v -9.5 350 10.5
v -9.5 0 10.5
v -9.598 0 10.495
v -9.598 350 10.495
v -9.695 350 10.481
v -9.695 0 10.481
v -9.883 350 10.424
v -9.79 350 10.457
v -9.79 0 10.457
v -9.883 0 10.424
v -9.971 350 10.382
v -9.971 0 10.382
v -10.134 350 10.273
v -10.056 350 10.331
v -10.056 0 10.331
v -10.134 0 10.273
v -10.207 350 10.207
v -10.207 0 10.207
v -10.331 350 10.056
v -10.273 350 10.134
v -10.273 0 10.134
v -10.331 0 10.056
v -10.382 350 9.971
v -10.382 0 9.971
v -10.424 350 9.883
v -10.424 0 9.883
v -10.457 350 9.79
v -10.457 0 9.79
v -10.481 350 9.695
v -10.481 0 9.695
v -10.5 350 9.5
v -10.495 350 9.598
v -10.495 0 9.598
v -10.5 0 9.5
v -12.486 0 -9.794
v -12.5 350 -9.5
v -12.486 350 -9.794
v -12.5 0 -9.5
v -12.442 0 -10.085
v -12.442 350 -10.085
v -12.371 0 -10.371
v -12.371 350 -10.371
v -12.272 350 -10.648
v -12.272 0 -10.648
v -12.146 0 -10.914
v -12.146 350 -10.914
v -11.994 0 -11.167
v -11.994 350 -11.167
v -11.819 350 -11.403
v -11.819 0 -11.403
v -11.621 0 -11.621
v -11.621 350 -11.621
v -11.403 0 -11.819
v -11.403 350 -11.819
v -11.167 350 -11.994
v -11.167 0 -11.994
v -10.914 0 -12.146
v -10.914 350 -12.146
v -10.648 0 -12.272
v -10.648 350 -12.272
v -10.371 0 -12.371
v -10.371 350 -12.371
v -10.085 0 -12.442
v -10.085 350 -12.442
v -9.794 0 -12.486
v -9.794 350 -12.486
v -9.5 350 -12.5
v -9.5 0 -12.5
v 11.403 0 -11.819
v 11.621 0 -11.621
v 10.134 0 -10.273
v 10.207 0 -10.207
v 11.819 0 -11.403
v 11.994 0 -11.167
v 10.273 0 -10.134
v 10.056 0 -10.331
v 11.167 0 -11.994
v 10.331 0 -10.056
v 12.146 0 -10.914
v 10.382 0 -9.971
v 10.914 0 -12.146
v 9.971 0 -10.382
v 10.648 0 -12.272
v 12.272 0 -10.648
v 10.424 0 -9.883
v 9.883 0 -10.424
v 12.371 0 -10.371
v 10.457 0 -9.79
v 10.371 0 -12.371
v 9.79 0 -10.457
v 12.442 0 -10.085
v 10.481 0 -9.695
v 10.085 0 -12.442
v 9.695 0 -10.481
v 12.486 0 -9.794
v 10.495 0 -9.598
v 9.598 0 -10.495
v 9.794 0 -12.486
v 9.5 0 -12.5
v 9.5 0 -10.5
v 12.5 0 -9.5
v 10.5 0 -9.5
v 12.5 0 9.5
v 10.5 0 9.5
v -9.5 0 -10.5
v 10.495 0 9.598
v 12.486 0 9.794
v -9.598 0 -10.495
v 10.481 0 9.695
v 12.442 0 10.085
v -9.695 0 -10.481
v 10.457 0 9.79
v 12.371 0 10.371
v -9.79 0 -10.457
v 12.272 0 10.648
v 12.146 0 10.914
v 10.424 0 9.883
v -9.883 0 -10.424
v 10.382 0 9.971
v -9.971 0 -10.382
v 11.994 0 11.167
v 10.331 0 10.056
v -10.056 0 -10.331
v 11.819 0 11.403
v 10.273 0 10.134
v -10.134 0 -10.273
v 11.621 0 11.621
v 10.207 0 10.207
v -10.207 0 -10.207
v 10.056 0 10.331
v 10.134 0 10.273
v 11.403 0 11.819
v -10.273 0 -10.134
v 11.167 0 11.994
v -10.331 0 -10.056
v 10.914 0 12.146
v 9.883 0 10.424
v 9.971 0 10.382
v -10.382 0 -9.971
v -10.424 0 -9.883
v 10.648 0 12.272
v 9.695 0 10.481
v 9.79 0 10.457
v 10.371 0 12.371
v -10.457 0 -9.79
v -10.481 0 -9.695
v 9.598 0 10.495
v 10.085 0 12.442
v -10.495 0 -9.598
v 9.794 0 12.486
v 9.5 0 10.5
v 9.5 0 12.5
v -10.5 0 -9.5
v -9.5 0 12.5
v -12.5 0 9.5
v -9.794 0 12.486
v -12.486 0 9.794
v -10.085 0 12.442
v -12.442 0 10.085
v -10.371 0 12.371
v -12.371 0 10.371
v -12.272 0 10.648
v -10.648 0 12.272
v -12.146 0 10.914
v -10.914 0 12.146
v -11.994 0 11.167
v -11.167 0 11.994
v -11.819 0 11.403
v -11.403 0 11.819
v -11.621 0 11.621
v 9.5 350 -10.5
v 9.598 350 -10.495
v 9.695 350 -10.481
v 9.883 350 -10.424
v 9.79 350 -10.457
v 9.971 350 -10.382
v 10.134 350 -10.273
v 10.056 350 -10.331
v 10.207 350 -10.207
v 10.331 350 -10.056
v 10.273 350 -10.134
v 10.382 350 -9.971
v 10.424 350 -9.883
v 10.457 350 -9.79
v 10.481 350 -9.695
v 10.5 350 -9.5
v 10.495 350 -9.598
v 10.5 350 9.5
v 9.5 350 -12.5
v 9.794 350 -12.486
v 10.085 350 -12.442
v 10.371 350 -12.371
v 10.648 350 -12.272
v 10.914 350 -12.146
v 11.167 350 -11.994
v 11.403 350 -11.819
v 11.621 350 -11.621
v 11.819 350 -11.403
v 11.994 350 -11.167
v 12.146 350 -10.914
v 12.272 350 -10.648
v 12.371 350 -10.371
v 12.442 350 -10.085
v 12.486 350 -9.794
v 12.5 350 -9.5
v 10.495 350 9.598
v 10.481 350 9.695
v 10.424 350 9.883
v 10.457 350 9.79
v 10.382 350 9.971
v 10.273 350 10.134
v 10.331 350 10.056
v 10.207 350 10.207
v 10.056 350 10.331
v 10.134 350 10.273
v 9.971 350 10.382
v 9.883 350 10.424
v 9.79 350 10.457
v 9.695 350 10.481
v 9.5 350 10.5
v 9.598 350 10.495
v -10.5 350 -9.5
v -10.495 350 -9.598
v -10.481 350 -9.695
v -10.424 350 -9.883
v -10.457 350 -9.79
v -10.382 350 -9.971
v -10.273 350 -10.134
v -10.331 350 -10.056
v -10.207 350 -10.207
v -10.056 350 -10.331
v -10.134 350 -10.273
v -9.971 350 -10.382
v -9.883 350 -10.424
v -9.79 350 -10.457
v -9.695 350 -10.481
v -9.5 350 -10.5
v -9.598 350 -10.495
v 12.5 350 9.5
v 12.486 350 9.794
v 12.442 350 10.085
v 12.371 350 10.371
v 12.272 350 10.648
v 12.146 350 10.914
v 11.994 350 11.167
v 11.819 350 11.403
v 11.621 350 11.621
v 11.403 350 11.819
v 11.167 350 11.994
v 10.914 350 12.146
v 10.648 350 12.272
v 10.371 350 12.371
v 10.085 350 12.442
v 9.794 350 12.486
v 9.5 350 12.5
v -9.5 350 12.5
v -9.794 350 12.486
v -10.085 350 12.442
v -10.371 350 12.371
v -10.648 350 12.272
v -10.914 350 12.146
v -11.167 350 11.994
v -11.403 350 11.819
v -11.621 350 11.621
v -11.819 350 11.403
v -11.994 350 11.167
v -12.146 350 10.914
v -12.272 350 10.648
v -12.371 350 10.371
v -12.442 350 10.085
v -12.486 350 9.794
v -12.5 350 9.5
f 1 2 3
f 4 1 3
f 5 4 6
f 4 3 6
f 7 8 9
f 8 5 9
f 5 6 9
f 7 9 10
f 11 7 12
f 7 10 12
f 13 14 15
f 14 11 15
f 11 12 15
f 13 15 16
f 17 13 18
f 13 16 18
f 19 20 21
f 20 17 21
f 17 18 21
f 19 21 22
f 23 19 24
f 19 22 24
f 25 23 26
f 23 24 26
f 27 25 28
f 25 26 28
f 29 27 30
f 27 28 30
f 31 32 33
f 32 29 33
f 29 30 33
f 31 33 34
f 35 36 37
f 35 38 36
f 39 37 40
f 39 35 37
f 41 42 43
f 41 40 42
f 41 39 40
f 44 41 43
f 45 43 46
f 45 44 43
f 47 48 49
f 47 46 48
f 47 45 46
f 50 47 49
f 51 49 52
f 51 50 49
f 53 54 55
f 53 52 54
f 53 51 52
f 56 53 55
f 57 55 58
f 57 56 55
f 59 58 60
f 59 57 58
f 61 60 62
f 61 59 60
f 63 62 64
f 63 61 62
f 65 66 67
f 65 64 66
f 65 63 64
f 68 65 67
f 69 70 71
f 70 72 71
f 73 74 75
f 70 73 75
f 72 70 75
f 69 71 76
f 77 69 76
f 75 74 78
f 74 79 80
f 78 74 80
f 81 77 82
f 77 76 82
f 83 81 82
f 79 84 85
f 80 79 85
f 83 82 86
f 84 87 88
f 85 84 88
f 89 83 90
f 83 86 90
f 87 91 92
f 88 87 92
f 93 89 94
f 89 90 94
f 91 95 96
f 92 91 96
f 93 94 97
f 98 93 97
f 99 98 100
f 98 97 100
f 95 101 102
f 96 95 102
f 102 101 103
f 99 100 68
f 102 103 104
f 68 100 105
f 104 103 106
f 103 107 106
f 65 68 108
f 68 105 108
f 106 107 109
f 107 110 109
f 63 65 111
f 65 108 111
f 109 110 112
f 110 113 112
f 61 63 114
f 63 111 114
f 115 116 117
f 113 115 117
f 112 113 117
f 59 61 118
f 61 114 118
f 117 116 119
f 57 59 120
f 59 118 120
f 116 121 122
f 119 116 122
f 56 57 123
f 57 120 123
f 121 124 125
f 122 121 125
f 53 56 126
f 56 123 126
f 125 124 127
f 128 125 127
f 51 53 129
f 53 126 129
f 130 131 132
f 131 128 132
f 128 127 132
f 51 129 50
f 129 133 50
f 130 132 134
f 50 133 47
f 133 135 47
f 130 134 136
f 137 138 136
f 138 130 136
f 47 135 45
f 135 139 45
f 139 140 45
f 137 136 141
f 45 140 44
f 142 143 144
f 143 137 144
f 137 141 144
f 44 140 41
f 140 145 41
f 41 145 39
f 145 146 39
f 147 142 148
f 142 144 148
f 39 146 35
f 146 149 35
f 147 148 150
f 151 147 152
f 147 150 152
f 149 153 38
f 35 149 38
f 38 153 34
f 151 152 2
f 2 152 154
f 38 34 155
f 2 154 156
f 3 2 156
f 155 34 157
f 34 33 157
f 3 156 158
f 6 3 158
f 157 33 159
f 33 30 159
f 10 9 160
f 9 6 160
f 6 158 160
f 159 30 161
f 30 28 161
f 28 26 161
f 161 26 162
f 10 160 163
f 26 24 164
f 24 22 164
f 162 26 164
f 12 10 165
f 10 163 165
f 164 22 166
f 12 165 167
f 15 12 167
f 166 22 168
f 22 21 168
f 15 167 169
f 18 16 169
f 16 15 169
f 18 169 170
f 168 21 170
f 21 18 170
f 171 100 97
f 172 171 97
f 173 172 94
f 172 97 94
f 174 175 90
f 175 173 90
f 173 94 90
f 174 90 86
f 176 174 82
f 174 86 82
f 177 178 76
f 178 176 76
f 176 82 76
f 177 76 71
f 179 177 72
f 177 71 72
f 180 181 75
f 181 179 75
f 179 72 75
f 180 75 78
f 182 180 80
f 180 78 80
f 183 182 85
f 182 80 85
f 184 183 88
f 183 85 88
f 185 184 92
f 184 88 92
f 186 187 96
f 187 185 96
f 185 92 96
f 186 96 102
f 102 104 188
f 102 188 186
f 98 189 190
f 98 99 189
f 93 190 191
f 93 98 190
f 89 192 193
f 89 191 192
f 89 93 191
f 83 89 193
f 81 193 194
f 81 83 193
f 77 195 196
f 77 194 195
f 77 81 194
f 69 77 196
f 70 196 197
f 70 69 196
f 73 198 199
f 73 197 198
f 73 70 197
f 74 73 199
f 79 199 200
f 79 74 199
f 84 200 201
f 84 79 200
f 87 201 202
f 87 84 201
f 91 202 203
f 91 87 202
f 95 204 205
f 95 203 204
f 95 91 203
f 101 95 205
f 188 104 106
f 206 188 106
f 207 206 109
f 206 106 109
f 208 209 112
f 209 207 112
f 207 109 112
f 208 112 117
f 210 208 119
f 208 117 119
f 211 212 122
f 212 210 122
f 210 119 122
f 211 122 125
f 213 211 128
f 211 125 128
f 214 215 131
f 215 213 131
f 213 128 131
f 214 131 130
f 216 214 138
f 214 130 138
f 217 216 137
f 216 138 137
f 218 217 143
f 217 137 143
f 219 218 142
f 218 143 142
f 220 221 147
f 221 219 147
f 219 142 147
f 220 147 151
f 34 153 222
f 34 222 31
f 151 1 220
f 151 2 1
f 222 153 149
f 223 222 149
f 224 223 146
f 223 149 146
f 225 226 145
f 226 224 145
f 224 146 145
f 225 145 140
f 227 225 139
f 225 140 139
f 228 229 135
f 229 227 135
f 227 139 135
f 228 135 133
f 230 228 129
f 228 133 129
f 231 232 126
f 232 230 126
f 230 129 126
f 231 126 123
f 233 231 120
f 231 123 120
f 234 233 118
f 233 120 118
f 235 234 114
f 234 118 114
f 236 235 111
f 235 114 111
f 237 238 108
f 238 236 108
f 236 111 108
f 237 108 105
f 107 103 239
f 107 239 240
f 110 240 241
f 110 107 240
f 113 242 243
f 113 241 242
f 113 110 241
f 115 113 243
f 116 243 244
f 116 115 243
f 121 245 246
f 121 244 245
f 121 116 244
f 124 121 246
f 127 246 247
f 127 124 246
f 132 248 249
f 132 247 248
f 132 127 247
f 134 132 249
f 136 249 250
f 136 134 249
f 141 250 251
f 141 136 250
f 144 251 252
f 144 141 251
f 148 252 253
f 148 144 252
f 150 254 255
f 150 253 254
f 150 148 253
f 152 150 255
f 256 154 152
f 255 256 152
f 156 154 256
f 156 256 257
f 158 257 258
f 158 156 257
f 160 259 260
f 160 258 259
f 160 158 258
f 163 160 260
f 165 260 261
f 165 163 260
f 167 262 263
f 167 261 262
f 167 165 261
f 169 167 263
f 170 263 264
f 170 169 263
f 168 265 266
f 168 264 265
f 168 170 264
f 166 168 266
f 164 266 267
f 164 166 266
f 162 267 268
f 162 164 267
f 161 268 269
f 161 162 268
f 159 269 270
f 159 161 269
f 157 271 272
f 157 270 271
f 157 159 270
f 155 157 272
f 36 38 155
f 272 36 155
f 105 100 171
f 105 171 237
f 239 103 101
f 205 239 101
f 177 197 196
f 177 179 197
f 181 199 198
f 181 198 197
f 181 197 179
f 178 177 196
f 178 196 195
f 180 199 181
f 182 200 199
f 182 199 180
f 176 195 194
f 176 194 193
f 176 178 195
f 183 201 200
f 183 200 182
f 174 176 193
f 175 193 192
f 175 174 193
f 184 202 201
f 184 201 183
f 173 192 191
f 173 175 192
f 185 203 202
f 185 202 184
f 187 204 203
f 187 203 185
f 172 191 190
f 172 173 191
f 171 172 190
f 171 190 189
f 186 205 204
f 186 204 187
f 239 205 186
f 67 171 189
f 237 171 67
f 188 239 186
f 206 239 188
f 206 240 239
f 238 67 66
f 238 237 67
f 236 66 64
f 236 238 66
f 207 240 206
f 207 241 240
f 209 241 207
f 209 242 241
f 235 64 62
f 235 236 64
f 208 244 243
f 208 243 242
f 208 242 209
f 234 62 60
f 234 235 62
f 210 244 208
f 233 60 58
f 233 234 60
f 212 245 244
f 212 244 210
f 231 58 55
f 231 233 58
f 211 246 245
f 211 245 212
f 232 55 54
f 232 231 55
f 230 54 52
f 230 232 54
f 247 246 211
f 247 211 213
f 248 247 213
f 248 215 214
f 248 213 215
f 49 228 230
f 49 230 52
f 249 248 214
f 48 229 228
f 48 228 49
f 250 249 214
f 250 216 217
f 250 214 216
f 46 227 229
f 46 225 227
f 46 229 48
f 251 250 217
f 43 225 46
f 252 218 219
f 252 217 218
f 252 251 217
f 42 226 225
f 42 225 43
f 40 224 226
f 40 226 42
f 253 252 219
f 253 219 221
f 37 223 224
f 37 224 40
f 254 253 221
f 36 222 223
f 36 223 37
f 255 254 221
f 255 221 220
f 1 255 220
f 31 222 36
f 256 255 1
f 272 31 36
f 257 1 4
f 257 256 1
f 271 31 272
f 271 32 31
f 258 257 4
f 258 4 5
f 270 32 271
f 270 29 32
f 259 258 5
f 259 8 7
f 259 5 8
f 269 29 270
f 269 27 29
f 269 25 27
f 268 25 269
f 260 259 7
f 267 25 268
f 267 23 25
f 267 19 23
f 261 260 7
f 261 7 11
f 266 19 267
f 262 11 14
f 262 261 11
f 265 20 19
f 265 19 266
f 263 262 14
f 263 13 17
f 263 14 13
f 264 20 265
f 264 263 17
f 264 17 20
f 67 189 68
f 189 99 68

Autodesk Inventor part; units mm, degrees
ref_plane "YZ Plane" through (0, 0, 0) normal (1, 0, 0) x (0, 1, 0)
ref_plane "XZ Plane" through (0, 0, 0) normal (0, 1, 0) x (-1, 0, 0)
ref_plane "XY Plane" through (0, 0, 0) normal (0, 0, 1) x (1, 0, 0)
sketch "Sketch1" plane through (0, 0, 0) normal (0, 1, 0) x (-1, 0, 0)
  line L0 (-9.5, 11.5) -> (9.5, 11.5) construction
  line L1 (11.5, 9.5) -> (11.5, -9.5) construction
  line L2 (9.5, -11.5) -> (-9.5, -11.5) construction
  line L3 (-11.5, -9.5) -> (-11.5, 9.5) construction
  line L4 (-11.5, 11.5) -> (11.5, -11.5) construction
  line L5 (11.5, 11.5) -> (-11.5, -11.5) construction
  arc A0 (11.5, 9.5) -> (9.5, 11.5) centre (9.5, 9.5) ccw construction
  arc A1 (9.5, -11.5) -> (11.5, -9.5) centre (9.5, -9.5) ccw construction
  arc A2 (-11.5, -9.5) -> (-9.5, -11.5) centre (-9.5, -9.5) ccw construction
  arc A3 (-9.5, 11.5) -> (-11.5, 9.5) centre (-9.5, 9.5) ccw construction
  line L6 (-9.5, -12.5) -> (9.5, -12.5)
  arc A4 (9.5, -12.5) -> (12.5, -9.5) centre (9.5, -9.5) ccw
  line L7 (12.5, -9.5) -> (12.5, 9.5)
  arc A5 (12.5, 9.5) -> (9.5, 12.5) centre (9.5, 9.5) ccw
  line L8 (9.5, 12.5) -> (-9.5, 12.5)
  arc A6 (-9.5, 12.5) -> (-12.5, 9.5) centre (-9.5, 9.5) ccw
  line L9 (-12.5, 9.5) -> (-12.5, -9.5)
  arc A7 (-12.5, -9.5) -> (-9.5, -12.5) centre (-9.5, -9.5) ccw
  line L10 (10.5, -9.5) -> (10.5, 9.5)
  arc A8 (10.5, 9.5) -> (9.5, 10.5) centre (9.5, 9.5) ccw
  line L11 (9.5, 10.5) -> (-9.5, 10.5)
  arc A9 (-9.5, 10.5) -> (-10.5, 9.5) centre (-9.5, 9.5) ccw
  line L12 (-10.5, 9.5) -> (-10.5, -9.5)
  arc A10 (-10.5, -9.5) -> (-9.5, -10.5) centre (-9.5, -9.5) ccw
  line L13 (-9.5, -10.5) -> (9.5, -10.5)
  arc A11 (9.5, -10.5) -> (10.5, -9.5) centre (9.5, -9.5) ccw
  point P0 (0, 0)
  point P1 (0, 0)
  point P2 (0, 0)
  dimension "d10" = 2
  dimension "depth" = 25
  dimension "width" = 25
  dimension "thickness" = 2
extrude "Extrusion1" add sketch "Sketch1" along normal blind 350
equation "\"d10\" = thickness"
properties part number "beam 25x25x2 1-2" material "Steel"
